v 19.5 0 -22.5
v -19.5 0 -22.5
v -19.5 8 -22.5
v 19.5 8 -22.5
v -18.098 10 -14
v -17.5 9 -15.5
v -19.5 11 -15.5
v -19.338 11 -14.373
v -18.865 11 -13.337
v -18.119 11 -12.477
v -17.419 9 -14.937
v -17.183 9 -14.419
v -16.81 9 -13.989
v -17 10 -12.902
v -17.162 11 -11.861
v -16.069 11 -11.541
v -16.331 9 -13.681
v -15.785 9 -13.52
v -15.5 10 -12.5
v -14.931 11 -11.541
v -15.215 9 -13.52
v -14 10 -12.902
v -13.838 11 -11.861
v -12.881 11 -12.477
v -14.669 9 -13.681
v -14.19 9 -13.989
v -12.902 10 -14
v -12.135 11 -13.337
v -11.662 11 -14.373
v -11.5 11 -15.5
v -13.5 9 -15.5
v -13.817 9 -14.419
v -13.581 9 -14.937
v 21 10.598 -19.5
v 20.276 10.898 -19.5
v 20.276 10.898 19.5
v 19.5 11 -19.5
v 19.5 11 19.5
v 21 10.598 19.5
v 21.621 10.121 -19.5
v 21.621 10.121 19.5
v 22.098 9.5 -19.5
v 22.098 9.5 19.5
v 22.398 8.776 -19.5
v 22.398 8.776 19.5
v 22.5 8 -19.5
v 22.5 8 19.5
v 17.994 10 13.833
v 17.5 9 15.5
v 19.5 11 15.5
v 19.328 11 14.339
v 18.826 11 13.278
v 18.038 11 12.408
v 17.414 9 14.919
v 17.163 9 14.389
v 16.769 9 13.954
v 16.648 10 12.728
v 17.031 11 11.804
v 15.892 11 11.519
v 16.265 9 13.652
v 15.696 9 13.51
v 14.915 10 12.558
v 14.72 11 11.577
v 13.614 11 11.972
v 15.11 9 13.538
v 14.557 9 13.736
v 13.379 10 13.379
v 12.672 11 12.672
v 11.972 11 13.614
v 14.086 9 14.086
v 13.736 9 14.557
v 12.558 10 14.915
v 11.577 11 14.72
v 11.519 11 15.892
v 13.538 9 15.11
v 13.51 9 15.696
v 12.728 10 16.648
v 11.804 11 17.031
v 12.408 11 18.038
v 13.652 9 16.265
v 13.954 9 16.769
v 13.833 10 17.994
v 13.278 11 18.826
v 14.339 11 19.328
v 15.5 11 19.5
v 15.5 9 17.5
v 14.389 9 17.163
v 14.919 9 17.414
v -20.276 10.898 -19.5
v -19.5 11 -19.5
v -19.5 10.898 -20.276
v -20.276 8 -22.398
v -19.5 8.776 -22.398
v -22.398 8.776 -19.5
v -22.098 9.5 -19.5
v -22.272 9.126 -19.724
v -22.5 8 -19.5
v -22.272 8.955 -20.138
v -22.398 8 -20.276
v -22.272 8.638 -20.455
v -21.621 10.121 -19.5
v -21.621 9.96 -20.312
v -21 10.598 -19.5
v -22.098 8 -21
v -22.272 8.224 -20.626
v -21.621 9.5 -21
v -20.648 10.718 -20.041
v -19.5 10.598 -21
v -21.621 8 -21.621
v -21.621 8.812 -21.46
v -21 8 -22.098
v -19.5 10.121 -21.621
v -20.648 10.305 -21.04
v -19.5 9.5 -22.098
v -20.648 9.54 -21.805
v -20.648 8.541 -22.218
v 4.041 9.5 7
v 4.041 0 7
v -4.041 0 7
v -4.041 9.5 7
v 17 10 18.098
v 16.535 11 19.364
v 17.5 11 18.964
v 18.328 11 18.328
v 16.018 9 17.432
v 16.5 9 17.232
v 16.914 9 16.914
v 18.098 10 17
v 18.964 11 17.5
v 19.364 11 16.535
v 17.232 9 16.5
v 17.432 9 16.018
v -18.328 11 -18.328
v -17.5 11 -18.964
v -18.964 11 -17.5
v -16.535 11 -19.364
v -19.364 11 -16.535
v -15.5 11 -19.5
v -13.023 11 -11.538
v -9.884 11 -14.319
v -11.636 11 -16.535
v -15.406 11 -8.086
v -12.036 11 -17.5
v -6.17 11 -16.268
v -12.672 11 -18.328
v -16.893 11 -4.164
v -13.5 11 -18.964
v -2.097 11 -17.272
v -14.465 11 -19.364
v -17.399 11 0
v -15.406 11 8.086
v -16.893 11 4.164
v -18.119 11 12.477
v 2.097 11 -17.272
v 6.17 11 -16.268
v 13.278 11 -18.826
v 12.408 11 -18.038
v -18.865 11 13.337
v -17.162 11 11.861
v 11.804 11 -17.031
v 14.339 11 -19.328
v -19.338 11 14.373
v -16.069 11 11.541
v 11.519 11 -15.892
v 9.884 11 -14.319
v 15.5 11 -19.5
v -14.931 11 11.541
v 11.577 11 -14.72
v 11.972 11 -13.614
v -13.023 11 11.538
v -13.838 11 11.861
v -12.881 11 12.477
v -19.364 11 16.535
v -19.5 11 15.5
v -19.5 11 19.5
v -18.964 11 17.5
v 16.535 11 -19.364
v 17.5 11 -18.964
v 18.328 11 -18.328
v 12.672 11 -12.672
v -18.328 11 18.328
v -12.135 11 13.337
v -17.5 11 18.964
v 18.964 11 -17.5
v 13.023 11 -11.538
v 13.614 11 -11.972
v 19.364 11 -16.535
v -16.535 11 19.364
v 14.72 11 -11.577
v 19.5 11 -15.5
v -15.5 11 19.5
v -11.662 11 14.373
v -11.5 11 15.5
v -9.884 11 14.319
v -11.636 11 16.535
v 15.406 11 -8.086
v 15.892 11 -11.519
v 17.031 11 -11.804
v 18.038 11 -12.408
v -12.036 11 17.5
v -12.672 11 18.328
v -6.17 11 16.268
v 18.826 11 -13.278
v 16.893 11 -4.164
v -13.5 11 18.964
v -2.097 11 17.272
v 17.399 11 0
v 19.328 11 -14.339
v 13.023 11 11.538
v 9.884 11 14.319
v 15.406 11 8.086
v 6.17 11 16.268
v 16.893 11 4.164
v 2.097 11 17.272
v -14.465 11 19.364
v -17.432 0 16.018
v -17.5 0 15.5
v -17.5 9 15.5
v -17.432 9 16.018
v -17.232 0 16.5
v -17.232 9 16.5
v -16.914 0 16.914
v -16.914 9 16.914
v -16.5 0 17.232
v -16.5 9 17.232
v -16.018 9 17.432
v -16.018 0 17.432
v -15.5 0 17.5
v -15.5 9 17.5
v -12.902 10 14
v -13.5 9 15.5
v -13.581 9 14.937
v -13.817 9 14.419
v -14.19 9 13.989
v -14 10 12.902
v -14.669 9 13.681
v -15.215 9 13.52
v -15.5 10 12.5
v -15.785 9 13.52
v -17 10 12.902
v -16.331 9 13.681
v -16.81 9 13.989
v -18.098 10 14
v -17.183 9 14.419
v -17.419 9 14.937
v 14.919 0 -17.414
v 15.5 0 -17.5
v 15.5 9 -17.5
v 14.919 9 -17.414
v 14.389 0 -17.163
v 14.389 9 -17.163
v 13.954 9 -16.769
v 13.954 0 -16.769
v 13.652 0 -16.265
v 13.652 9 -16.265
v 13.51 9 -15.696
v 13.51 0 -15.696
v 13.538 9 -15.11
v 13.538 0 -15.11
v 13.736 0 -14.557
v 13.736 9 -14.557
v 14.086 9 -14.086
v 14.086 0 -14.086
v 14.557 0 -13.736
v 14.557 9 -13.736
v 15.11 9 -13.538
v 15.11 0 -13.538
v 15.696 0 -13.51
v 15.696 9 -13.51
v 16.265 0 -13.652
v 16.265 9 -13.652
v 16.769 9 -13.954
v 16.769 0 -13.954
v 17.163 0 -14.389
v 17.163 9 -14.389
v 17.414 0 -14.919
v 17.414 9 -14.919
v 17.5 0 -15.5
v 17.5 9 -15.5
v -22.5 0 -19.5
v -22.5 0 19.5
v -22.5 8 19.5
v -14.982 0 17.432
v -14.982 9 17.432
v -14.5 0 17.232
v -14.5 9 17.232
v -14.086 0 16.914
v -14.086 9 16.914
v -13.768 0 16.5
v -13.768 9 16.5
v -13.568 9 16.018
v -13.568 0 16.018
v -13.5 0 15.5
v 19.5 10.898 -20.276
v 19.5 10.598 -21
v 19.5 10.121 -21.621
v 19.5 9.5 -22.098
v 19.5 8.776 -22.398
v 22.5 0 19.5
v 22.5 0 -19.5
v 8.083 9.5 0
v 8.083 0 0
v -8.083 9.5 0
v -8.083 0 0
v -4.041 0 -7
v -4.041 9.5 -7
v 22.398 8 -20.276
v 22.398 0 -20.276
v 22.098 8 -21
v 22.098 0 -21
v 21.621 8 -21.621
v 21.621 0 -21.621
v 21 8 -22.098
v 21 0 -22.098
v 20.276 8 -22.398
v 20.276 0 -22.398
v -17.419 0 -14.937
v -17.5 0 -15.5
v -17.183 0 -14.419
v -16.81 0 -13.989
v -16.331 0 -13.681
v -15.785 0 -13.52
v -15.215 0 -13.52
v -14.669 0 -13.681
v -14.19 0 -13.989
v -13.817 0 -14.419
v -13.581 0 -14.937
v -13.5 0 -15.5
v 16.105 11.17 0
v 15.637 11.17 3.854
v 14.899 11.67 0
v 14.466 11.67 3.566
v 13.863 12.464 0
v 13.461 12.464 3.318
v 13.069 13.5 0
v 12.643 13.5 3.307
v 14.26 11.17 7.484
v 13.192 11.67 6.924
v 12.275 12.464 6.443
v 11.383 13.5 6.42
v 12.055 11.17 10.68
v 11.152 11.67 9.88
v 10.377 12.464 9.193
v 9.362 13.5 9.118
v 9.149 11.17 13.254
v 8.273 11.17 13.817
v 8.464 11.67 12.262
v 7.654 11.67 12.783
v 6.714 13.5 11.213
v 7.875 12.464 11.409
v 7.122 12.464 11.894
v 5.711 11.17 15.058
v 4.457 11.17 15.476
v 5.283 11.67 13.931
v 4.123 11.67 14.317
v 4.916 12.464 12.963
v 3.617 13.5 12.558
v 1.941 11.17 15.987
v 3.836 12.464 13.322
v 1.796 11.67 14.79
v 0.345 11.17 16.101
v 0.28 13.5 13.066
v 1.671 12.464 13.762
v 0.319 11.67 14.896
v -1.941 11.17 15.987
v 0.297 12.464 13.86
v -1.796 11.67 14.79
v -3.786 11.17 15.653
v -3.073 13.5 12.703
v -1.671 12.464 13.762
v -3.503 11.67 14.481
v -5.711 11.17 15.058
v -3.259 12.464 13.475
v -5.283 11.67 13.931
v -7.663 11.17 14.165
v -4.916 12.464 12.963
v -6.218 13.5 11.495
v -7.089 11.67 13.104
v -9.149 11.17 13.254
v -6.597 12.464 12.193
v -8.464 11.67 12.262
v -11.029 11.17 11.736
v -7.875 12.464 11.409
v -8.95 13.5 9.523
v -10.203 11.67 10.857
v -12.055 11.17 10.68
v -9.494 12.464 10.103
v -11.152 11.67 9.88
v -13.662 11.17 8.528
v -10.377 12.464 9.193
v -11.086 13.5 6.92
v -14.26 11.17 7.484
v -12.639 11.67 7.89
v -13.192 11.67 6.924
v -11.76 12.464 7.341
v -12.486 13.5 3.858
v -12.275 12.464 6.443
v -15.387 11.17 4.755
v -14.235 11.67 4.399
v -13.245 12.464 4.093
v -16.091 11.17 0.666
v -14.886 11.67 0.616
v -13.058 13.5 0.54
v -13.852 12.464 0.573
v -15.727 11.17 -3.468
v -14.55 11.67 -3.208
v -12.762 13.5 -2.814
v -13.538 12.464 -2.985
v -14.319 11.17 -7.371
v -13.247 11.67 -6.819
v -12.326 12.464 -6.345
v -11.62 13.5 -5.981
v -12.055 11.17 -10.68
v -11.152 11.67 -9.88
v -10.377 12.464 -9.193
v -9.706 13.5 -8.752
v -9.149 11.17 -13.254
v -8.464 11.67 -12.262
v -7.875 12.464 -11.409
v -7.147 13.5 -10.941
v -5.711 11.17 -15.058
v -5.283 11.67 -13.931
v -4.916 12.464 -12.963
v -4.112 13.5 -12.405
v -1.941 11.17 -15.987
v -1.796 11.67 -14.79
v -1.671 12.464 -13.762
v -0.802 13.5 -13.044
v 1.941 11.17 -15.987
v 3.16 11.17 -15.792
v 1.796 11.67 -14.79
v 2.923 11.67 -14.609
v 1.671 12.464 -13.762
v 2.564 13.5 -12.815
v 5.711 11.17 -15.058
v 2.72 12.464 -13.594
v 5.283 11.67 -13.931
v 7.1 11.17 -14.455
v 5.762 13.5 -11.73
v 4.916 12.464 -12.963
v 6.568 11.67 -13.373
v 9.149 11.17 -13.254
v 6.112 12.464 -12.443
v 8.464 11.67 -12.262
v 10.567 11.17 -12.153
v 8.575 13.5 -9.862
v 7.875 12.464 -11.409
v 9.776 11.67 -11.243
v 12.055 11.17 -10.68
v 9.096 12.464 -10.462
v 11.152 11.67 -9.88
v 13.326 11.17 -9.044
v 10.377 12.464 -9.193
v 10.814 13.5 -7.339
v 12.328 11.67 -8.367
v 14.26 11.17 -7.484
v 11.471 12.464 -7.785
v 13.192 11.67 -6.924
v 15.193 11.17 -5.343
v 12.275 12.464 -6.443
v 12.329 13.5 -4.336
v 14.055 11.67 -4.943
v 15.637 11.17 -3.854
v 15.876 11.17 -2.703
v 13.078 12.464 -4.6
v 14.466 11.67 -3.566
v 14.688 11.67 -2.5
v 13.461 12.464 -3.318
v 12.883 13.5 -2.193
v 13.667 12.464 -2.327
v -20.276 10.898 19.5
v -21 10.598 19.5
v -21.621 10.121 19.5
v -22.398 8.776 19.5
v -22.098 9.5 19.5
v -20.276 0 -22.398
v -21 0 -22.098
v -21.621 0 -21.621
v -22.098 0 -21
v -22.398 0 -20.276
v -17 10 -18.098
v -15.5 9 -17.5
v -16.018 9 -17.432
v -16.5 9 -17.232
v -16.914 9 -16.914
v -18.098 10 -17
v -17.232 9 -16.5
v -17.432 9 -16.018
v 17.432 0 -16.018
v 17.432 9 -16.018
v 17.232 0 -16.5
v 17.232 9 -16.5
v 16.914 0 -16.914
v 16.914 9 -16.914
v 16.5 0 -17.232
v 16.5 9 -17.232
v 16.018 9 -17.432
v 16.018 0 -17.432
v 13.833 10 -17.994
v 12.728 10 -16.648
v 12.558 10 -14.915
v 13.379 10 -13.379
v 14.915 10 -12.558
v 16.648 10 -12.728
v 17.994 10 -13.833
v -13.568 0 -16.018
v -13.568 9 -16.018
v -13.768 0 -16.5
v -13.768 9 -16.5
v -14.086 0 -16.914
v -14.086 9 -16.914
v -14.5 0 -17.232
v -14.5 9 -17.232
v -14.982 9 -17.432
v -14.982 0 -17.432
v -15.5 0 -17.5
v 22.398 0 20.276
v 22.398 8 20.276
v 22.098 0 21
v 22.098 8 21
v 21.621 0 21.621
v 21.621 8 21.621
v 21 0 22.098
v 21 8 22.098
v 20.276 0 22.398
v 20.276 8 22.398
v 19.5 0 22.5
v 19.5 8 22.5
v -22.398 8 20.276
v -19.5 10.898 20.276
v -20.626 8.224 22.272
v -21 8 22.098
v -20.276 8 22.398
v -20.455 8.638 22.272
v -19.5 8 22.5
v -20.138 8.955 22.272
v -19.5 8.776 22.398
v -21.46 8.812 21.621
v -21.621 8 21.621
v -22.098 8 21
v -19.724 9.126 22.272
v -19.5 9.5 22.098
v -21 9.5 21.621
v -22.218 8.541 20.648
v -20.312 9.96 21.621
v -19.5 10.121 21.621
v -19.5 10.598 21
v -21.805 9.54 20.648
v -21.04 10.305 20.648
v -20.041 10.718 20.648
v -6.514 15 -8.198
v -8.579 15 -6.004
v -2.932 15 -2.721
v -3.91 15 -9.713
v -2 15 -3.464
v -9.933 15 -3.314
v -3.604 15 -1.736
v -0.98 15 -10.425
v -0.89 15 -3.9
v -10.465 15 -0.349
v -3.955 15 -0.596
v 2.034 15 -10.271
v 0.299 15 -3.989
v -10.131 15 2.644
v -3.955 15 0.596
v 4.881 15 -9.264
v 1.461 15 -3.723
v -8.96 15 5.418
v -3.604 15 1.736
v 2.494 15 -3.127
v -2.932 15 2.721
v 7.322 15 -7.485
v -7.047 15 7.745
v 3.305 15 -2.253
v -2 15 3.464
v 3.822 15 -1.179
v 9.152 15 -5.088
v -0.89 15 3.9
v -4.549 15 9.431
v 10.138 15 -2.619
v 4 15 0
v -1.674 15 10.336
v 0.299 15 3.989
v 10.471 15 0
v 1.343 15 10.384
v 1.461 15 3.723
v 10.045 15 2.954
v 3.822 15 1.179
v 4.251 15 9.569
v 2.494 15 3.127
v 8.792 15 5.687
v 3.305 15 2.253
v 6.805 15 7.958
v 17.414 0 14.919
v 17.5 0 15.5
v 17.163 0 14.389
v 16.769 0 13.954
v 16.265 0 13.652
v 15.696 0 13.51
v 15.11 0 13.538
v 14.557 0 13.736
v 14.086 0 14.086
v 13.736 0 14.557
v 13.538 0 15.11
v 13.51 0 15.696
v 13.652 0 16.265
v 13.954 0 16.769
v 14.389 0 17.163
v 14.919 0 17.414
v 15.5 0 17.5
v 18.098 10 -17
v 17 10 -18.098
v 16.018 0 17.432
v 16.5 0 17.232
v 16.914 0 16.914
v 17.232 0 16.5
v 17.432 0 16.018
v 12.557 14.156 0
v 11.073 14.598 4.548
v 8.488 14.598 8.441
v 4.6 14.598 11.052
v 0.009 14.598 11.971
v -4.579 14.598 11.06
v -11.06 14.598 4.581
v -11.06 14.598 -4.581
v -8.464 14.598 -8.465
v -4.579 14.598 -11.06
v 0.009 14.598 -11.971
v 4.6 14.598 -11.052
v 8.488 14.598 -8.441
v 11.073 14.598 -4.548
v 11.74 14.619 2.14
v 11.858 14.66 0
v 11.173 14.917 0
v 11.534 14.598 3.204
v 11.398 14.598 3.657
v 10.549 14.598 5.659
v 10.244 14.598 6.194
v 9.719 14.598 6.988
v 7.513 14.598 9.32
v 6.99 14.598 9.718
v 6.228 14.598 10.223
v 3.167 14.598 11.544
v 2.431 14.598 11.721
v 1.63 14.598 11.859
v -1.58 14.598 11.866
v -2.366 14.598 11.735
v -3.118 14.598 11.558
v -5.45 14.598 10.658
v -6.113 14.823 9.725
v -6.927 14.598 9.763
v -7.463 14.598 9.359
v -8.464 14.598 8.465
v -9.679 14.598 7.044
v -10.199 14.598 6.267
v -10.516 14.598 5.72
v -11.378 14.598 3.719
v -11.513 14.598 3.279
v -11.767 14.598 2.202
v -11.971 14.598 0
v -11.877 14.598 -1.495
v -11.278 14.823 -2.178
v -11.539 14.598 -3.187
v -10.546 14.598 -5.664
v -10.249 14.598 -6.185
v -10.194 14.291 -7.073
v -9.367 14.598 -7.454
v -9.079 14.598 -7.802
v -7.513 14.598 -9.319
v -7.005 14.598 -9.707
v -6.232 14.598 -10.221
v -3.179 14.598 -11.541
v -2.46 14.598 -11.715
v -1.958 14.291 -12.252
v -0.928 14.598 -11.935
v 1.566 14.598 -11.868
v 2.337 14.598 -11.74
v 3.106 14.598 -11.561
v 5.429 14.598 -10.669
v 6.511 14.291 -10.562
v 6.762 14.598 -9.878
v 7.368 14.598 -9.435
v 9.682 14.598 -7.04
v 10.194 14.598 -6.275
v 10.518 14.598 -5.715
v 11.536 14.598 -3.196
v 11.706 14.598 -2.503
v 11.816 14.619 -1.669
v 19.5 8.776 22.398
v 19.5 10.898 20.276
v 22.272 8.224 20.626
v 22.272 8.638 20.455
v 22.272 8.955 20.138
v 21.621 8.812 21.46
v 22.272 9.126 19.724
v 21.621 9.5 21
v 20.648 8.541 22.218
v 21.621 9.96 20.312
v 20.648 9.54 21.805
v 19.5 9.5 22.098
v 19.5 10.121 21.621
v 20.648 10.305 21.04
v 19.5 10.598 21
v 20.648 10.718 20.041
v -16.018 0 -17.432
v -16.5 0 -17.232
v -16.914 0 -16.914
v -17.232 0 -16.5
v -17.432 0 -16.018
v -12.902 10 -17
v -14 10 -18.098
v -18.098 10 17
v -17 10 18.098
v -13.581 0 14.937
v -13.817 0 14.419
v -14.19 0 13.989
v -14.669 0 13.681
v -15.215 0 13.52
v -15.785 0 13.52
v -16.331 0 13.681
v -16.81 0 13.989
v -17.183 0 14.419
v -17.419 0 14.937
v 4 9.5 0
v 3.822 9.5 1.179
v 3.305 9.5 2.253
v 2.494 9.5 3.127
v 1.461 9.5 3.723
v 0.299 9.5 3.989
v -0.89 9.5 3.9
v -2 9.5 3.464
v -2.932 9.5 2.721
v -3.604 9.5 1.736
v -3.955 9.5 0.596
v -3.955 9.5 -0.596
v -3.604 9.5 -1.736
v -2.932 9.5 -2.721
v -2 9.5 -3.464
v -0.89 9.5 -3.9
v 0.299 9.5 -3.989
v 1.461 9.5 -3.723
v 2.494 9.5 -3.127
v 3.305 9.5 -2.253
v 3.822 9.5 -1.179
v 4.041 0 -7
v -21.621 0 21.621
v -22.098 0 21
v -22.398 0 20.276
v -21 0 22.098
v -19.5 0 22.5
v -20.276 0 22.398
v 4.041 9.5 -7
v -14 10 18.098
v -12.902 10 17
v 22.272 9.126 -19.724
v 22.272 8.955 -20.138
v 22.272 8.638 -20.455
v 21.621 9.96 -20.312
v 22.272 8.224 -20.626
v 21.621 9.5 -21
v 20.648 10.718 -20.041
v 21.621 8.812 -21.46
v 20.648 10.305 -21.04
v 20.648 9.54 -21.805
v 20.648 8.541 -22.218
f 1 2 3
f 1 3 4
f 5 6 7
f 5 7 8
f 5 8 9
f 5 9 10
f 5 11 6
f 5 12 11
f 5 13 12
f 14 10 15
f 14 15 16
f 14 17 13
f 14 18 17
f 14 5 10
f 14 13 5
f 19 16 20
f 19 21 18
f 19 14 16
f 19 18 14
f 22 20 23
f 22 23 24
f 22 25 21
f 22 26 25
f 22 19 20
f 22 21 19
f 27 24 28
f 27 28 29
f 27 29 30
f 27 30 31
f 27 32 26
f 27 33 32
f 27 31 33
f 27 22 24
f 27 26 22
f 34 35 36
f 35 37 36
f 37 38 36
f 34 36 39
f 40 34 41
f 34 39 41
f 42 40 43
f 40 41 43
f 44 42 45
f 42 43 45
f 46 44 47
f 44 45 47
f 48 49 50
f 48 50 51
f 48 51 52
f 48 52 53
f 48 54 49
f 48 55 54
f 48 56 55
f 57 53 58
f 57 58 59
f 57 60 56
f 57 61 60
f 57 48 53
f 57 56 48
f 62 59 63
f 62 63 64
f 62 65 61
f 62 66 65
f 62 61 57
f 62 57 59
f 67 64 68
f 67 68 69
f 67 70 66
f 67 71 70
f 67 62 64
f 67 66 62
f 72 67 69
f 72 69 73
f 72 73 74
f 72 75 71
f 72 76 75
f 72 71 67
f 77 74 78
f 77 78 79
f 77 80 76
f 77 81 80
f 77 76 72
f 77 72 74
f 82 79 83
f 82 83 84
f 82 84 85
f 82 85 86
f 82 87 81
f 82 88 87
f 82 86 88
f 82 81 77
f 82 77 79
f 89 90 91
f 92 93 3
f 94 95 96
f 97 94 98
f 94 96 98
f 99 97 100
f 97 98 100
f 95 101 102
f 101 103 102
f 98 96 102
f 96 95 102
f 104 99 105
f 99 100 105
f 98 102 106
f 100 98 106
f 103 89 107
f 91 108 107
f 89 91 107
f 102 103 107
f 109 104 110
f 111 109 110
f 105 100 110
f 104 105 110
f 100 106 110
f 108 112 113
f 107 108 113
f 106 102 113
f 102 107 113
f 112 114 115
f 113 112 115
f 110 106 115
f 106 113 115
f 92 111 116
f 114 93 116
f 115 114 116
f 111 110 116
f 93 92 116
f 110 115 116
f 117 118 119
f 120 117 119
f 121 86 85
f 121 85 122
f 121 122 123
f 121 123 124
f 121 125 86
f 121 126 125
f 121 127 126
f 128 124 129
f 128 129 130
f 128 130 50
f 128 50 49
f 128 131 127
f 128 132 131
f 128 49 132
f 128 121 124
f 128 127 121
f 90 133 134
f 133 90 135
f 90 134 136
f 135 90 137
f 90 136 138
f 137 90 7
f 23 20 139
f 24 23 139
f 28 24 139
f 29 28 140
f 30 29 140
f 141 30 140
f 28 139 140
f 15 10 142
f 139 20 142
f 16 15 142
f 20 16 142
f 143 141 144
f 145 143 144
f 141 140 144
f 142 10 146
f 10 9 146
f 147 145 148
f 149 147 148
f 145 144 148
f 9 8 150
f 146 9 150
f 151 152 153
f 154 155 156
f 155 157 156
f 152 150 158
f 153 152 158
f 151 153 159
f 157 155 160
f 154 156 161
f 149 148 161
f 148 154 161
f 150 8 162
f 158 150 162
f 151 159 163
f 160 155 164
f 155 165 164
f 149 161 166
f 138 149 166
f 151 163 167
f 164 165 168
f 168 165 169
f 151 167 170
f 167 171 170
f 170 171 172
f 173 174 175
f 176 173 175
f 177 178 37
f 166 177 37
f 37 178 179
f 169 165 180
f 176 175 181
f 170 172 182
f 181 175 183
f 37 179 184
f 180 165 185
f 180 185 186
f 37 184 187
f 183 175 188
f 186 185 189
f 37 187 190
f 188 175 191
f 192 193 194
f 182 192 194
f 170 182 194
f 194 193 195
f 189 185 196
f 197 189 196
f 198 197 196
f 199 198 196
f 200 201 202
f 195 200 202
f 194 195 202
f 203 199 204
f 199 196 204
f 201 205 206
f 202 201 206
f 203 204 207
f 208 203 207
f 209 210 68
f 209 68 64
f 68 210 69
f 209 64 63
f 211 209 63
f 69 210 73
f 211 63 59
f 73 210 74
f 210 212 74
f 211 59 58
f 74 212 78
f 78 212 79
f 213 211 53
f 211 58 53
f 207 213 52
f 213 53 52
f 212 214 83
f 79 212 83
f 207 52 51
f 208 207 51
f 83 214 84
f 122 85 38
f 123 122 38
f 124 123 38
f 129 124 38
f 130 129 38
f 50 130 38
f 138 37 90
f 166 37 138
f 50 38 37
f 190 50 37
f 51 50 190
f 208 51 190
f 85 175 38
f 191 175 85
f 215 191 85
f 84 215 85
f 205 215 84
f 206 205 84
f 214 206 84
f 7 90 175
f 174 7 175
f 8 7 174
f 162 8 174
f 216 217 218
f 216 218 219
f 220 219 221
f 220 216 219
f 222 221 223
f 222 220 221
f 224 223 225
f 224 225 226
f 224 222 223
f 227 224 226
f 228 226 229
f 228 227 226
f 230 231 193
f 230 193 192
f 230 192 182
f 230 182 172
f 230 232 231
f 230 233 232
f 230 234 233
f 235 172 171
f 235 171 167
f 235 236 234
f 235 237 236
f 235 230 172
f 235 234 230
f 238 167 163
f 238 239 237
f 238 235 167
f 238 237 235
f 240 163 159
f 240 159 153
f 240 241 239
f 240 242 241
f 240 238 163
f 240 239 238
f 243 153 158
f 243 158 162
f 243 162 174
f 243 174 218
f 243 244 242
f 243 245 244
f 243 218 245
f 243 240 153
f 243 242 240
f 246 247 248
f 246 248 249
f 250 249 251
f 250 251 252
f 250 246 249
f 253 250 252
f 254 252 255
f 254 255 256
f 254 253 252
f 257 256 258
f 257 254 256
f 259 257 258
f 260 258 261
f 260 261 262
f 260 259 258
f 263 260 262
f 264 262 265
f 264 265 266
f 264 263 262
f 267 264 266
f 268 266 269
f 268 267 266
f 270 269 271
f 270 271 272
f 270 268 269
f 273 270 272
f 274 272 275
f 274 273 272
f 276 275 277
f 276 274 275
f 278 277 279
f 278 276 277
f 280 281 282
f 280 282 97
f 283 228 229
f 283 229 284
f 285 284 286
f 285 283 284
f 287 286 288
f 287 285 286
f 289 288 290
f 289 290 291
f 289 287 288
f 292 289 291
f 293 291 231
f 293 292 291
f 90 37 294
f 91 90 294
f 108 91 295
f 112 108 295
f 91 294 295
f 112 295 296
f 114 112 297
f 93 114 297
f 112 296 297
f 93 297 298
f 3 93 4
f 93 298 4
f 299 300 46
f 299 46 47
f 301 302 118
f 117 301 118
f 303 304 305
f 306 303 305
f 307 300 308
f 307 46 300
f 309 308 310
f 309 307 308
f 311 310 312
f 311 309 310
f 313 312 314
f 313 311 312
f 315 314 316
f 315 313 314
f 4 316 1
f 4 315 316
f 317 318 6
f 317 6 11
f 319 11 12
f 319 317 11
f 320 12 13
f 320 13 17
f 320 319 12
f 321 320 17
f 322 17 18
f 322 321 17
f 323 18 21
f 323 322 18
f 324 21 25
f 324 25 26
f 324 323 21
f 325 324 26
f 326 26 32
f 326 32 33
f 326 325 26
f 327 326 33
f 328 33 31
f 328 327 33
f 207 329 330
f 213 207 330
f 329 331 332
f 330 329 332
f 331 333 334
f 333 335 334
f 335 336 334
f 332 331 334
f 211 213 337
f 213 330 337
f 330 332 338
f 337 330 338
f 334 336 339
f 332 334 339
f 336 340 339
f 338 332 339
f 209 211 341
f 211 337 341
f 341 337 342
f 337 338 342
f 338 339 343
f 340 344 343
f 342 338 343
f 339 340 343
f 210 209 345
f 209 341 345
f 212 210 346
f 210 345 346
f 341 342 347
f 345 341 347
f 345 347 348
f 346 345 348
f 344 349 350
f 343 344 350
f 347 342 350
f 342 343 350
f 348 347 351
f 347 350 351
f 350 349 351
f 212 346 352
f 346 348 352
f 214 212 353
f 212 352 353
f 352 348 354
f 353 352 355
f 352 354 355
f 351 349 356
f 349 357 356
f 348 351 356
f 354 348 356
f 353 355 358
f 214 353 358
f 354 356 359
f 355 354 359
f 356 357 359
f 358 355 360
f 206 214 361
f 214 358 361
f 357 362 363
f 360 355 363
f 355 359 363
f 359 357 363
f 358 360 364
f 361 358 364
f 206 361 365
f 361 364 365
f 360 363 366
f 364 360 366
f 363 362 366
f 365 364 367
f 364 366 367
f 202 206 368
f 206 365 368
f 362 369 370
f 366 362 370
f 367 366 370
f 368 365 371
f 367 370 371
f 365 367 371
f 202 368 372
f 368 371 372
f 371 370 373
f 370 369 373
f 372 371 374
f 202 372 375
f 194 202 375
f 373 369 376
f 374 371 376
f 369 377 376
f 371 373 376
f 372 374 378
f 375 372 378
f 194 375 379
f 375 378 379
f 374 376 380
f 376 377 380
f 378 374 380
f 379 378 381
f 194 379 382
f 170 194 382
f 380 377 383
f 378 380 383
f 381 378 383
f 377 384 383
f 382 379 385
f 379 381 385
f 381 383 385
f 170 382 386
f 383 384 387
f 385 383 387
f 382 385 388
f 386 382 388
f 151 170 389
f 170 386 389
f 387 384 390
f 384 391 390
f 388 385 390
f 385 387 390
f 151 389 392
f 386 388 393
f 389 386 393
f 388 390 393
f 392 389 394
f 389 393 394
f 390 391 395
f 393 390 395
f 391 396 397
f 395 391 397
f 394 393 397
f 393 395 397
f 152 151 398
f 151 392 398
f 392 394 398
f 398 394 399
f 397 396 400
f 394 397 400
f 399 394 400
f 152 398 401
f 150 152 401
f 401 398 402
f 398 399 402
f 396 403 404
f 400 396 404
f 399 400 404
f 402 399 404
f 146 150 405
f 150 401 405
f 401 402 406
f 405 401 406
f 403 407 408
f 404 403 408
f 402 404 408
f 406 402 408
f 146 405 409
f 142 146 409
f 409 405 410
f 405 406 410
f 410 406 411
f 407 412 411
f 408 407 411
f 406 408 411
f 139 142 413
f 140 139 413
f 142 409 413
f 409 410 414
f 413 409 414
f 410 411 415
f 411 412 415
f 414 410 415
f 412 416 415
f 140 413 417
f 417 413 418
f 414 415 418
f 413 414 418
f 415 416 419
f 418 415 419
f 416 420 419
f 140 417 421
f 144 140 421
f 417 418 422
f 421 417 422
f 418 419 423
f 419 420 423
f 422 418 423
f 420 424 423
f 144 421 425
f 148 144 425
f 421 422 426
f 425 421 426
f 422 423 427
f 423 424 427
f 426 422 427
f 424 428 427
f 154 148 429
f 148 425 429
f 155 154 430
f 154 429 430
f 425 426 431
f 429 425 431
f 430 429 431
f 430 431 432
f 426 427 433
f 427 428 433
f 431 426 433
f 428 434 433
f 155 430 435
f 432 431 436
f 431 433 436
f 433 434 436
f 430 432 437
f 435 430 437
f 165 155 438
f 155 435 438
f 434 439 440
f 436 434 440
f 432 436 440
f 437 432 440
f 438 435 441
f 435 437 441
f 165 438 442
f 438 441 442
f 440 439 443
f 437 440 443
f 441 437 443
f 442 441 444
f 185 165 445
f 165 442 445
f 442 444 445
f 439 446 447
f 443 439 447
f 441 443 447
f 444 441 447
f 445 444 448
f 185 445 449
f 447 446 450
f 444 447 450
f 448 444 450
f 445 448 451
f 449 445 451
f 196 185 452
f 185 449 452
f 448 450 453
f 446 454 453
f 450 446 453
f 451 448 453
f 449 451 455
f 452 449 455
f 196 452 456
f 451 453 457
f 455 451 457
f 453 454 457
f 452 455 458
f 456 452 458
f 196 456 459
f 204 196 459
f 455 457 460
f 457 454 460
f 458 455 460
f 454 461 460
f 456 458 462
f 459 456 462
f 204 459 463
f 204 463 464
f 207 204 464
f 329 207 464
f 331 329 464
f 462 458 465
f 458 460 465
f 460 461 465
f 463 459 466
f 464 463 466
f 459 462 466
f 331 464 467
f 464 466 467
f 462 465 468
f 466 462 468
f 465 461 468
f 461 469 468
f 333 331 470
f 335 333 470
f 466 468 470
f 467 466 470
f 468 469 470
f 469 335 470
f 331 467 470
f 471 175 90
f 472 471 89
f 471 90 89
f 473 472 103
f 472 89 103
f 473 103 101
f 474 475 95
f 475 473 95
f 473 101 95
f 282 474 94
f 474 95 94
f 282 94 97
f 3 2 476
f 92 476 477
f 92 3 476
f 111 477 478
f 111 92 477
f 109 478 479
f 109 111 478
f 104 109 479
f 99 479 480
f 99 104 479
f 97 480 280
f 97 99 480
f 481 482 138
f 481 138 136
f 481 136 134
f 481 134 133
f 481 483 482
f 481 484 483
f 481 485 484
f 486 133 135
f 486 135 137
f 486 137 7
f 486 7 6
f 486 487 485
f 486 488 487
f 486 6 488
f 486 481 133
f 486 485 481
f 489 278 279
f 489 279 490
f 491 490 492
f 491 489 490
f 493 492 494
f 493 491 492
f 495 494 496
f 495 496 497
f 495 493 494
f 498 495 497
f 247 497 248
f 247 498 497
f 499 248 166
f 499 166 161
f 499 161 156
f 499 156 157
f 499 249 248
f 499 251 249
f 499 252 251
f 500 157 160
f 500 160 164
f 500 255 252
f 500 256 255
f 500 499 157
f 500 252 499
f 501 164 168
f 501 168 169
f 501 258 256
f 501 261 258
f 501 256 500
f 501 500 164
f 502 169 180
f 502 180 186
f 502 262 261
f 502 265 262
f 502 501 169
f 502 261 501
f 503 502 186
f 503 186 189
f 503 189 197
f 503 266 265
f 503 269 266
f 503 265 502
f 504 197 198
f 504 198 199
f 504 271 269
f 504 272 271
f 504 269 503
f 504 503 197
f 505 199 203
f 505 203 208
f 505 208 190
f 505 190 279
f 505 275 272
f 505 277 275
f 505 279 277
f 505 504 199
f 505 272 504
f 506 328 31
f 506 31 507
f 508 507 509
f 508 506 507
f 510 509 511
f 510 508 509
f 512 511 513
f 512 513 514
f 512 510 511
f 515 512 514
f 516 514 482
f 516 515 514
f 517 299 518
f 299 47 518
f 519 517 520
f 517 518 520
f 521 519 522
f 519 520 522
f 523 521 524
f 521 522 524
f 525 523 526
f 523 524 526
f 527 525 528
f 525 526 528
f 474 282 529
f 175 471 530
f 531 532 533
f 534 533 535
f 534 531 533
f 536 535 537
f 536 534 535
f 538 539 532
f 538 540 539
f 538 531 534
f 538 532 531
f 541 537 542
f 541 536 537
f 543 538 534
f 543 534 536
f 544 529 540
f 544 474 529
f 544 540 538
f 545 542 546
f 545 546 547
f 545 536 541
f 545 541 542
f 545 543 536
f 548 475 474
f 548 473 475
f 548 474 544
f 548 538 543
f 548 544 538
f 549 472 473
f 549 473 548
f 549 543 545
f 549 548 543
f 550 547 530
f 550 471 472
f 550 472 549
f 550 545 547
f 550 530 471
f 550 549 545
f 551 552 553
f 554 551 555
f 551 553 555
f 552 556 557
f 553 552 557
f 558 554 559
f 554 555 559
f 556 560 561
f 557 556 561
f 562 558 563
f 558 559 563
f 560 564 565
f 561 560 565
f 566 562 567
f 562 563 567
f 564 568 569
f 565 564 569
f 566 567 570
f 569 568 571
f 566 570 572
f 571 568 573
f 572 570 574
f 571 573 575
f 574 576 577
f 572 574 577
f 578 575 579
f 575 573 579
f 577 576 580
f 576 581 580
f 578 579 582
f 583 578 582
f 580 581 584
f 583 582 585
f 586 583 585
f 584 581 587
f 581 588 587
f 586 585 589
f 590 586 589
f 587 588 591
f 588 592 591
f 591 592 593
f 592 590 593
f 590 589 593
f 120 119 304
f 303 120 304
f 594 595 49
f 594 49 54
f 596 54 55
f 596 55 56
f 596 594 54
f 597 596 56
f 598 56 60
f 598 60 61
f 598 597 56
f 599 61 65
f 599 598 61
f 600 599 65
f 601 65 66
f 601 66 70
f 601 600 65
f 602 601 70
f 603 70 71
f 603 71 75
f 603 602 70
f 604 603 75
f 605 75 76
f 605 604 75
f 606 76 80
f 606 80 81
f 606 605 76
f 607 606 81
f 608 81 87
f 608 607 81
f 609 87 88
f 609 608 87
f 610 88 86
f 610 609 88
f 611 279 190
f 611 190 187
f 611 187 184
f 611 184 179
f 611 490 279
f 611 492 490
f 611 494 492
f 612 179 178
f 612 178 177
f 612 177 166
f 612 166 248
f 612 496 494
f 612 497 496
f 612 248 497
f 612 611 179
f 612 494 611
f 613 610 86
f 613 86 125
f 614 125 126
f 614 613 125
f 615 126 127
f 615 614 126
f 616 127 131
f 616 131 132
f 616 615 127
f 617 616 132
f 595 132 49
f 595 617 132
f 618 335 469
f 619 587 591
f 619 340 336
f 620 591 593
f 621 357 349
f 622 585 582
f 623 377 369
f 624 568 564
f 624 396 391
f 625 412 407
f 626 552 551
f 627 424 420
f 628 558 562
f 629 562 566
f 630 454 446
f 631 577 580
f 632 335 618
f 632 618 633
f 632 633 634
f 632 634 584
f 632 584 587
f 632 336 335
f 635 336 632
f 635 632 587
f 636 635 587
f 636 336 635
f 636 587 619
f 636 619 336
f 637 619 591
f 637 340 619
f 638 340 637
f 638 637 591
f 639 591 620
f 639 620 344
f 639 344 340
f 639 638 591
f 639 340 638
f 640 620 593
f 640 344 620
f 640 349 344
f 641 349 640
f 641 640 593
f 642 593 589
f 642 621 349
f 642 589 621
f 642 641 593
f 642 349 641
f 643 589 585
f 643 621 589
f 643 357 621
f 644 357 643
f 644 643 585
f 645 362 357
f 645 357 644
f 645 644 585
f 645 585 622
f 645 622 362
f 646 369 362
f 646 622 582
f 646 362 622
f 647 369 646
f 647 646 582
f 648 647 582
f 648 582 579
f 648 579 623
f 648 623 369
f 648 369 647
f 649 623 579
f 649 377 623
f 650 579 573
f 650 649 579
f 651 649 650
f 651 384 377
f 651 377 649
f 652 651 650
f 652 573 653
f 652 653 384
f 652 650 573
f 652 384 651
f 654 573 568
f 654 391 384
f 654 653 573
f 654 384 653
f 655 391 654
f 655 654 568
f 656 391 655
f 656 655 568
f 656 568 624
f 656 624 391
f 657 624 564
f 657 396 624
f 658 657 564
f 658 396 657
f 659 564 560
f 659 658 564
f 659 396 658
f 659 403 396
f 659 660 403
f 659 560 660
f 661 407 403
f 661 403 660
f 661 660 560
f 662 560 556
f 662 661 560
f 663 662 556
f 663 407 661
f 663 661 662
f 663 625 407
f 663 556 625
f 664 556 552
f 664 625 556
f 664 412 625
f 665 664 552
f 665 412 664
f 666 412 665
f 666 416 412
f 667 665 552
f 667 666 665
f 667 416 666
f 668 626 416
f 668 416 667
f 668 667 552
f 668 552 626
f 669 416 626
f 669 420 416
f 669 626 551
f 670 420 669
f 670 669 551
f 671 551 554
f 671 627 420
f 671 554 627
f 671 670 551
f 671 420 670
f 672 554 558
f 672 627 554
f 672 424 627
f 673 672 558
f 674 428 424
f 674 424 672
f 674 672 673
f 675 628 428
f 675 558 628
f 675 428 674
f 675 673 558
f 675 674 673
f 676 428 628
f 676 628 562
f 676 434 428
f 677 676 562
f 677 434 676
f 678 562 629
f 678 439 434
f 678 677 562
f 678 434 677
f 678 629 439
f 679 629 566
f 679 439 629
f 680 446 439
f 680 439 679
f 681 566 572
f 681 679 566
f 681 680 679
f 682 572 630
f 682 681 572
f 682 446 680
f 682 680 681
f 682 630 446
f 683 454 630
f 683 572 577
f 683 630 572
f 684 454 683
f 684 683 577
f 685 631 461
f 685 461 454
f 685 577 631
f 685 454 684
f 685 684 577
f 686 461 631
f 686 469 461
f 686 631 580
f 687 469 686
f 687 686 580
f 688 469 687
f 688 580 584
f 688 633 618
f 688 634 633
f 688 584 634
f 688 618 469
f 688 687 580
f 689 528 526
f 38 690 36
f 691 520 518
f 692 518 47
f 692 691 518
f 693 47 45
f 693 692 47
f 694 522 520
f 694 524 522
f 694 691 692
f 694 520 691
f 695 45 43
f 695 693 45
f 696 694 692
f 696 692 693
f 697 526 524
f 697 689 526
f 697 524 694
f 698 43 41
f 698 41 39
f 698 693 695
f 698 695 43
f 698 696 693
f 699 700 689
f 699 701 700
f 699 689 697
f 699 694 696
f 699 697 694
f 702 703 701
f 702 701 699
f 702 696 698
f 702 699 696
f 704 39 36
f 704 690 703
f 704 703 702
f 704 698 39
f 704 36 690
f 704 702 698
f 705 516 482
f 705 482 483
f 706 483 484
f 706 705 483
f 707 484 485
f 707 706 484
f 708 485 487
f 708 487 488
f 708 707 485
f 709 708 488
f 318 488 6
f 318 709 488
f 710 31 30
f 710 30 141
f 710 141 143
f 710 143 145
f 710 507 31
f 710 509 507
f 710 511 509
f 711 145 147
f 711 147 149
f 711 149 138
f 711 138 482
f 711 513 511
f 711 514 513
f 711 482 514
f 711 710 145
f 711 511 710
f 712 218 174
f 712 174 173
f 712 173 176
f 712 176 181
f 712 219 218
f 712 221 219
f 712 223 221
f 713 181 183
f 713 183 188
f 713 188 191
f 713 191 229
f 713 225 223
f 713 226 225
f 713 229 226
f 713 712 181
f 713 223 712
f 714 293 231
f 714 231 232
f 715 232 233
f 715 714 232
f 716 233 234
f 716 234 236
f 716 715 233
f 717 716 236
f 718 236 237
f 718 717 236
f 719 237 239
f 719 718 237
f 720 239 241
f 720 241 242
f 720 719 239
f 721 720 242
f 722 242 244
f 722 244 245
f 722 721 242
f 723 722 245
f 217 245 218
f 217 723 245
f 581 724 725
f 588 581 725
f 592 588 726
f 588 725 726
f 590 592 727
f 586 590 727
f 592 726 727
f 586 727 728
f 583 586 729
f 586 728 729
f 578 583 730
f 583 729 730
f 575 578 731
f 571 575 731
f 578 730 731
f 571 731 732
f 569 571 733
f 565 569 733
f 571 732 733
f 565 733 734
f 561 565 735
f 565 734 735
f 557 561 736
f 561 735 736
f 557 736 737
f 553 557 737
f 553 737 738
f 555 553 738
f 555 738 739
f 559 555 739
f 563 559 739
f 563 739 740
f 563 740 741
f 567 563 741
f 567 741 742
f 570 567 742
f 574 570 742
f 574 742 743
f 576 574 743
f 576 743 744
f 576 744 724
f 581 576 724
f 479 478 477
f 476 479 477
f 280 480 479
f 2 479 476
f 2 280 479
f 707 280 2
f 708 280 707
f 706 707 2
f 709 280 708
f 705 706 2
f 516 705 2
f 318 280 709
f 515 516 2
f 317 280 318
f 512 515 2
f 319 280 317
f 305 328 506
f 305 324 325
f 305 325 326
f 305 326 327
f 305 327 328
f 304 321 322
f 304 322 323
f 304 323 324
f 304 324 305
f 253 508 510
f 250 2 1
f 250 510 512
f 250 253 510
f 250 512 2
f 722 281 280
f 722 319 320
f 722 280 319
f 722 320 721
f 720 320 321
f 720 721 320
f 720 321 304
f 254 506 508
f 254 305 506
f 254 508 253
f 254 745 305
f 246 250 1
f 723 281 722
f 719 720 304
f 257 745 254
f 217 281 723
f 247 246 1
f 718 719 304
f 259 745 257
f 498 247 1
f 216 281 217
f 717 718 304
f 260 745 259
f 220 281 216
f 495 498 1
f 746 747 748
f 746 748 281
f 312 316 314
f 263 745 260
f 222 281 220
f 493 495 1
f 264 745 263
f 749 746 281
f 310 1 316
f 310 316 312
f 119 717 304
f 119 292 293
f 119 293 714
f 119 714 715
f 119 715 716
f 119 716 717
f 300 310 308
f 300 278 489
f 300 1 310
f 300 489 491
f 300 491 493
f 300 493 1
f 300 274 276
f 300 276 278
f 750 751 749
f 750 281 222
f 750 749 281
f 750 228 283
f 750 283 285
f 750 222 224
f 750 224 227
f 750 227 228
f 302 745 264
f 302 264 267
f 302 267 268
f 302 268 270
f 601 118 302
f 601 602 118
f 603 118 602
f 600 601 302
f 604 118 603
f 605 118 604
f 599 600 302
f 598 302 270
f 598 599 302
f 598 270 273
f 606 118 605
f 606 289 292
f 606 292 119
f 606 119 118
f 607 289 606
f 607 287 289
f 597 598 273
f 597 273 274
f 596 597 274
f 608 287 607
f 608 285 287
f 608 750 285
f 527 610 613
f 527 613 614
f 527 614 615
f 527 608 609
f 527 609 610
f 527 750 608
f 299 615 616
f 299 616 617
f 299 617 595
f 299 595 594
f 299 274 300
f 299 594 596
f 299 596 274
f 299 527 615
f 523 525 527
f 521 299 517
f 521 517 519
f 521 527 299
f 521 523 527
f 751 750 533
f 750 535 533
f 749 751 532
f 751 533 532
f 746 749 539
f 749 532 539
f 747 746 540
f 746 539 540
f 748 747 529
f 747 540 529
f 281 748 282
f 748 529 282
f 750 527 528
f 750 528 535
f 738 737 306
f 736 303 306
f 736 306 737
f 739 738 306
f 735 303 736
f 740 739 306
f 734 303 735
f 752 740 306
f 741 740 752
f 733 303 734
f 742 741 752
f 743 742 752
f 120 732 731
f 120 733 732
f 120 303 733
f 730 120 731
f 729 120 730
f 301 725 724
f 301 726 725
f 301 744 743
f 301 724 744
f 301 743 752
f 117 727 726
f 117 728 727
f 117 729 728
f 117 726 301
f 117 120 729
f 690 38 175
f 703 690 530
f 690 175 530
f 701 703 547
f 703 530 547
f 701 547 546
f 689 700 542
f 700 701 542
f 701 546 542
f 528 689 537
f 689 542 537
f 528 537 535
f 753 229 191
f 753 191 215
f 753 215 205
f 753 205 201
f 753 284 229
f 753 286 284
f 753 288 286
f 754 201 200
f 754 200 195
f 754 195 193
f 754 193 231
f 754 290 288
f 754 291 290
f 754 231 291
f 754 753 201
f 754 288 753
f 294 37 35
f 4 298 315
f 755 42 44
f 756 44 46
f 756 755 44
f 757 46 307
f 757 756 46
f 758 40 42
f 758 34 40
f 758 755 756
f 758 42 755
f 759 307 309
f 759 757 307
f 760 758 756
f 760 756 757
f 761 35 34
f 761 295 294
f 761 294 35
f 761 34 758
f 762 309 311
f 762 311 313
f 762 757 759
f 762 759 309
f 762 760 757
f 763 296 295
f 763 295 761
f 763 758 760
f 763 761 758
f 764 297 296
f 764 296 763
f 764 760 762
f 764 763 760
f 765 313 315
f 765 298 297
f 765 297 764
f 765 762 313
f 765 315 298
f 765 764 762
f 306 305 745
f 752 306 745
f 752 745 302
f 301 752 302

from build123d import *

# Parameters (mm, degrees)
F0_R     = 12.5
F0_R_2   = 4
F1_DEPTH = 11
F2_DEPTH = 15
F3_DEPTH = 9.5
F5_R     = 3
F6_SIZE  = 1.99999


# Not quite as in the source:
# - a fillet or chamfer that OpenCascade refuses, or shapes differently, is made with other operations: its cross-section is extruded or revolved along the edge and cut away or added
# - a fillet or chamfer is up to 0.001 mm smaller than in the source, because OpenCascade refuses the exact size


with BuildPart() as f1:
    # F0 (on Front) → F1 (new body)
    with BuildSketch(Plane.XZ):
        with BuildLine():
            Line((15.5, -22.5), (22.5, -22.5))
            Line((22.5, -22.5), (22.5, -15.5))
            Line((22.5, -15.5), (17.5, -15.5))
            ThreePointArc((17.5, -15.5), (16.9142135624, -16.9142135624), (15.5, -17.5))
            Line((15.5, -17.5), (15.5, -22.5))
        make_face()
        with BuildLine():
            Line((-15.5, -22.5), (15.5, -22.5))
            Line((15.5, -22.5), (15.5, -17.5))
            ThreePointArc((15.5, -17.5), (14.0857864376, -14.0857864376), (17.5, -15.5))
            Line((17.5, -15.5), (22.5, -15.5))
            Line((22.5, -15.5), (22.5, 15.5))
            Line((22.5, 15.5), (17.5, 15.5))
            ThreePointArc((17.5, 15.5), (14.0857864376, 14.0857864376), (15.5, 17.5))
            Line((15.5, 17.5), (15.5, 22.5))
            Line((15.5, 22.5), (-15.5, 22.5))
            Line((-15.5, 22.5), (-15.5, 17.5))
            ThreePointArc((-15.5, 17.5), (-14.0857864376, 16.9142135624), (-13.5, 15.5))
            ThreePointArc((-13.5, 15.5), (-15.5, 13.5), (-17.5, 15.5))
            Line((-17.5, 15.5), (-22.5, 15.5))
            Line((-22.5, 15.5), (-22.5, -15.5))
            Line((-22.5, -15.5), (-17.5, -15.5))
            ThreePointArc((-17.5, -15.5), (-15.5, -13.5), (-13.5, -15.5))
            ThreePointArc((-13.5, -15.5), (-14.0857864376, -16.9142135624), (-15.5, -17.5))
            Line((-15.5, -17.5), (-15.5, -22.5))
        make_face()
        Circle(F0_R, mode=Mode.SUBTRACT)
        with BuildLine():
            Line((-22.5, -22.5), (-15.5, -22.5))
            Line((-15.5, -22.5), (-15.5, -17.5))
            ThreePointArc((-15.5, -17.5), (-16.9142135624, -16.9142135624), (-17.5, -15.5))
            Line((-17.5, -15.5), (-22.5, -15.5))
            Line((-22.5, -15.5), (-22.5, -22.5))
        make_face()
        with BuildLine():
            Line((17.5, 15.5), (22.5, 15.5))
            Line((22.5, 15.5), (22.5, 22.5))
            Line((22.5, 22.5), (15.5, 22.5))
            Line((15.5, 22.5), (15.5, 17.5))
            ThreePointArc((15.5, 17.5), (16.9142135624, 16.9142135624), (17.5, 15.5))
        make_face()
        with BuildLine():
            Line((-22.5, 22.5), (-22.5, 15.5))
            Line((-22.5, 15.5), (-17.5, 15.5))
            ThreePointArc((-17.5, 15.5), (-16.9142135624, 16.9142135624), (-15.5, 17.5))
            Line((-15.5, 17.5), (-15.5, 22.5))
            Line((-15.5, 22.5), (-22.5, 22.5))
        make_face()
        Circle(F0_R)
        Polygon((8.0829037687, 0), (4.0414518843, -7), (-4.0414518843, -7), (-8.0829037687, 0), (-4.0414518843, 7), (4.0414518843, 7), align=None, mode=Mode.SUBTRACT)
        Polygon((-4.0414518843, -7), (4.0414518843, -7), (8.0829037687, 0), (4.0414518843, 7), (-4.0414518843, 7), (-8.0829037687, 0), align=None)
        Circle(F0_R_2, mode=Mode.SUBTRACT)
    extrude(amount=-F1_DEPTH)

    # F0 (on Front) → F2 (join)
    with BuildSketch(Plane.XZ):
        Circle(F0_R)
        Polygon((8.0829037687, 0), (4.0414518843, -7), (-4.0414518843, -7), (-8.0829037687, 0), (-4.0414518843, 7), (4.0414518843, 7), align=None, mode=Mode.SUBTRACT)
        Polygon((-4.0414518843, -7), (4.0414518843, -7), (8.0829037687, 0), (4.0414518843, 7), (-4.0414518843, 7), (-8.0829037687, 0), align=None)
        Circle(F0_R_2, mode=Mode.SUBTRACT)
    extrude(amount=-F2_DEPTH)

    # F0 (on Front) → F3 (cut)
    with BuildSketch(Plane.XZ):
        Polygon((-4.0414518843, -7), (4.0414518843, -7), (8.0829037687, 0), (4.0414518843, 7), (-4.0414518843, 7), (-8.0829037687, 0), align=None)
        Circle(F0_R_2, mode=Mode.SUBTRACT)
    extrude(amount=-F3_DEPTH, mode=Mode.SUBTRACT)

    # F4: fillet of radius 5 on 1 edges, made by hand

    # F4_s1 → F4_t2 (revolve)
    with BuildSketch(Plane.XY):
        with BuildLine():
            ThreePointArc((17.3989794856, 11), (14.2367018254, 12.1270166538), (12.5, 15))
            Line((12.5, 15), (12.5, 11))
            Line((12.5, 11), (17.3989794856, 11))
        make_face()
    revolve(axis=Axis((0, 11, 0), (0, -1, 0)))

    # F5
    f5_edges = [f1.edges().sort_by_distance(p)[0] for p in [
        (-12.5, 15, 0),
        (0, 11, -22.5),
        (-22.5, 11, 0),
        (-22.5, 5.5, -22.5),
        (-22.5, 5.5, 22.5),
        (0, 11, 22.5),
        (22.5, 5.5, 22.5),
        (22.5, 11, 0),
        (22.5, 5.5, -22.5),
    ]]
    fillet(f5_edges, radius=F5_R)

    # F6 (size 2 in the source; OpenCascade refuses exactly that, so slightly less here)
    f6_edges = [f1.edges().sort_by_distance(p)[0] for p in [
        (-13.5, 11, 15.5),
        (-15.5, 11, -13.5),
        (15.5, 11, -13.5),
        (15.5, 11, 13.5),
    ]]
    chamfer(f6_edges, length=F6_SIZE)


solid = f1.part
